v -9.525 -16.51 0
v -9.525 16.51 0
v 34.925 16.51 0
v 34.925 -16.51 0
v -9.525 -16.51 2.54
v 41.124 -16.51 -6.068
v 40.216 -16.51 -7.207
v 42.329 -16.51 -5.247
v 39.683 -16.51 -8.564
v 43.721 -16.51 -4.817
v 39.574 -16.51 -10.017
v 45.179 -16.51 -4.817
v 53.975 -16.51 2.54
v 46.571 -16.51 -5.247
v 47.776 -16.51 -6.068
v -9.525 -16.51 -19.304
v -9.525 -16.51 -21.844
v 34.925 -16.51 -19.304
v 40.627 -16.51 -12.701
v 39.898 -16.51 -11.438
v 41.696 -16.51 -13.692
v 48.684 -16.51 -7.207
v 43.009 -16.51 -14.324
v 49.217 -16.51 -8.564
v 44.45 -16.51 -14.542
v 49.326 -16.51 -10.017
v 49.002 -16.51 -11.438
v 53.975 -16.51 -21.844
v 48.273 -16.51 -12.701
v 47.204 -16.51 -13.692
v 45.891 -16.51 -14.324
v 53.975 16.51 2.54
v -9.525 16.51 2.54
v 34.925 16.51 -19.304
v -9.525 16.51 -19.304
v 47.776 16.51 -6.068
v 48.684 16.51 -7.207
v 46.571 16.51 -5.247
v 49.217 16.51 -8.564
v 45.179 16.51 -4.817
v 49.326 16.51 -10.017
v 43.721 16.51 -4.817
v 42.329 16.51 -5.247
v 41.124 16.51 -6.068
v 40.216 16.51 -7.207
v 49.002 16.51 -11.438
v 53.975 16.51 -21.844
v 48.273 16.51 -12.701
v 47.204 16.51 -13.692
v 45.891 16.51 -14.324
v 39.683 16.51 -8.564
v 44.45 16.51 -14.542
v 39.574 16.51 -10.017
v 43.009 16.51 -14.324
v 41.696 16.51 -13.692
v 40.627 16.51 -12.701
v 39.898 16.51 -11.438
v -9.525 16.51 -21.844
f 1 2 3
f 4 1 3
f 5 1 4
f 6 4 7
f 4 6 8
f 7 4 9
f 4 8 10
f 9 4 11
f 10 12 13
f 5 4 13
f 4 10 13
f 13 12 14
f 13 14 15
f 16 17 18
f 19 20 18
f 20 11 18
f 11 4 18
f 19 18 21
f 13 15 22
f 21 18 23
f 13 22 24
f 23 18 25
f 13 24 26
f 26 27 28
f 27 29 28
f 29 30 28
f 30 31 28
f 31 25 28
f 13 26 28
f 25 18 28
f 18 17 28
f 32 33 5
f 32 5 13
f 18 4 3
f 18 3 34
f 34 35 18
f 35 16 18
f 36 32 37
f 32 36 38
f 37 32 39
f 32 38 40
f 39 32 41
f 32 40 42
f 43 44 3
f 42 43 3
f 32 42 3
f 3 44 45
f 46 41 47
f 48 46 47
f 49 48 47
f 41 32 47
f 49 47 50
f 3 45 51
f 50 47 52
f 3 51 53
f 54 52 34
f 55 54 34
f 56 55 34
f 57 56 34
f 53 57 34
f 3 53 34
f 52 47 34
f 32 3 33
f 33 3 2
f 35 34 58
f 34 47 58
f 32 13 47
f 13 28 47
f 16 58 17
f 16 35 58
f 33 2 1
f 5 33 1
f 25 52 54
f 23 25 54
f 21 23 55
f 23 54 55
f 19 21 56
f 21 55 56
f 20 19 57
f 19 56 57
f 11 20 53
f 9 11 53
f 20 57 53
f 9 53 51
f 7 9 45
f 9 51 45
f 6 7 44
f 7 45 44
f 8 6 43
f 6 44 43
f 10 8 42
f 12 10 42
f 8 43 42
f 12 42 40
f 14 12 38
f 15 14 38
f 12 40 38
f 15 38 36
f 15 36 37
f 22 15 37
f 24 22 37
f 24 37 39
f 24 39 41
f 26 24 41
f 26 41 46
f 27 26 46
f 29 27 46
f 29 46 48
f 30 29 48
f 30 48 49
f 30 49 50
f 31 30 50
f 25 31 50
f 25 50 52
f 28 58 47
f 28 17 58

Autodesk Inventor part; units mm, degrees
ref_plane "YZ Plane" through (0, 0, 0) normal (1, 0, 0) x (0, 1, 0)
ref_plane "XZ Plane" through (0, 0, 0) normal (0, 1, 0) x (-1, 0, 0)
ref_plane "XY Plane" through (0, 0, 0) normal (0, 0, 1) x (1, 0, 0)
ref_plane "Work Plane1" through (0, 0, 0) normal (0, 0, 1) x (1, 0, 0)
sketch "Sketch1" plane through (0, 0, 0) normal (0, 0, 1) x (1, 0, 0)
  line L0 (3, 16.51) -> (-3, 16.51) construction
  line L1 (-3, -16.51) -> (3, -16.51) construction
  line L2 (-9.525, -16.51) -> (-9.525, 173.99) construction
  line L3 (9.525, -16.51) -> (9.525, 173.99) construction
  line L4 (-9.525, -16.51) -> (53.975, -16.51)
  line L5 (53.975, -16.51) -> (53.975, 16.51)
  line L6 (53.975, 16.51) -> (-9.525, 16.51)
  line L7 (-9.525, 16.51) -> (-9.525, -16.51)
  point P0 (0, 0)
  dimension "d0" = 63.5
extrude "Extrusion1" add sketch "Sketch1" along normal blind 2.54
ref_plane "Work Plane2" through (0, 0, -19.304) normal (0, 0, -1) x (1, 0, 0)
sketch "Sketch2" plane through (0, 0, -19.304) normal (0, 0, -1) x (1, 0, 0)
  line L0 (-9.525, 16.51) -> (53.975, 16.51) projected
  line L1 (53.975, -16.51) -> (-9.525, -16.51) projected
  line L2 (-9.525, 16.51) -> (53.975, 16.51)
  line L3 (53.975, 16.51) -> (53.975, -16.51)
  line L4 (53.975, -16.51) -> (-9.525, -16.51)
  line L5 (-9.525, -16.51) -> (-9.525, 16.51)
  point P0 (0, 0)
  dimension "d3" = 63.5
extrude "Extrusion2" add sketch "Sketch2" along normal blind 2.54
sketch "Sketch3" plane through (-9.525, -16.51, 0) normal (0, -1, 0) x (1, 0, 0)
  line L0 (63.5, 0) -> (0, 0) projected
  line L1 (0, -19.304) -> (63.5, -19.304) projected
  line L2 (63.5, 0) -> (44.45, 0)
  line L3 (44.45, 0) -> (44.45, -19.304)
  line L4 (44.45, -19.304) -> (63.5, -19.304)
  line L5 (63.5, -19.304) -> (63.5, 0)
  point P0 (9.525, 0)
  dimension "d6" = 19.05
extrude "Extrusion3" add sketch "Sketch3" against normal blind 33.02
sketch "Sketch4" plane through (-9.525, -16.51, 2.54) normal (0, -1, 0) x (1, 0, 0)
  line L0 (44.45, -21.844) -> (44.45, -2.54) construction
  line L1 (44.45, -12.192) -> (63.5, -12.192) construction
  point P0 (9.525, -2.54)
  point P1 (53.975, -12.192)
hole "Hole1" at (44.45, -16.51, -9.652) direction (0, 1, 0) diameter 9.779 end through all
properties part number "XRailVerticalExtension"
